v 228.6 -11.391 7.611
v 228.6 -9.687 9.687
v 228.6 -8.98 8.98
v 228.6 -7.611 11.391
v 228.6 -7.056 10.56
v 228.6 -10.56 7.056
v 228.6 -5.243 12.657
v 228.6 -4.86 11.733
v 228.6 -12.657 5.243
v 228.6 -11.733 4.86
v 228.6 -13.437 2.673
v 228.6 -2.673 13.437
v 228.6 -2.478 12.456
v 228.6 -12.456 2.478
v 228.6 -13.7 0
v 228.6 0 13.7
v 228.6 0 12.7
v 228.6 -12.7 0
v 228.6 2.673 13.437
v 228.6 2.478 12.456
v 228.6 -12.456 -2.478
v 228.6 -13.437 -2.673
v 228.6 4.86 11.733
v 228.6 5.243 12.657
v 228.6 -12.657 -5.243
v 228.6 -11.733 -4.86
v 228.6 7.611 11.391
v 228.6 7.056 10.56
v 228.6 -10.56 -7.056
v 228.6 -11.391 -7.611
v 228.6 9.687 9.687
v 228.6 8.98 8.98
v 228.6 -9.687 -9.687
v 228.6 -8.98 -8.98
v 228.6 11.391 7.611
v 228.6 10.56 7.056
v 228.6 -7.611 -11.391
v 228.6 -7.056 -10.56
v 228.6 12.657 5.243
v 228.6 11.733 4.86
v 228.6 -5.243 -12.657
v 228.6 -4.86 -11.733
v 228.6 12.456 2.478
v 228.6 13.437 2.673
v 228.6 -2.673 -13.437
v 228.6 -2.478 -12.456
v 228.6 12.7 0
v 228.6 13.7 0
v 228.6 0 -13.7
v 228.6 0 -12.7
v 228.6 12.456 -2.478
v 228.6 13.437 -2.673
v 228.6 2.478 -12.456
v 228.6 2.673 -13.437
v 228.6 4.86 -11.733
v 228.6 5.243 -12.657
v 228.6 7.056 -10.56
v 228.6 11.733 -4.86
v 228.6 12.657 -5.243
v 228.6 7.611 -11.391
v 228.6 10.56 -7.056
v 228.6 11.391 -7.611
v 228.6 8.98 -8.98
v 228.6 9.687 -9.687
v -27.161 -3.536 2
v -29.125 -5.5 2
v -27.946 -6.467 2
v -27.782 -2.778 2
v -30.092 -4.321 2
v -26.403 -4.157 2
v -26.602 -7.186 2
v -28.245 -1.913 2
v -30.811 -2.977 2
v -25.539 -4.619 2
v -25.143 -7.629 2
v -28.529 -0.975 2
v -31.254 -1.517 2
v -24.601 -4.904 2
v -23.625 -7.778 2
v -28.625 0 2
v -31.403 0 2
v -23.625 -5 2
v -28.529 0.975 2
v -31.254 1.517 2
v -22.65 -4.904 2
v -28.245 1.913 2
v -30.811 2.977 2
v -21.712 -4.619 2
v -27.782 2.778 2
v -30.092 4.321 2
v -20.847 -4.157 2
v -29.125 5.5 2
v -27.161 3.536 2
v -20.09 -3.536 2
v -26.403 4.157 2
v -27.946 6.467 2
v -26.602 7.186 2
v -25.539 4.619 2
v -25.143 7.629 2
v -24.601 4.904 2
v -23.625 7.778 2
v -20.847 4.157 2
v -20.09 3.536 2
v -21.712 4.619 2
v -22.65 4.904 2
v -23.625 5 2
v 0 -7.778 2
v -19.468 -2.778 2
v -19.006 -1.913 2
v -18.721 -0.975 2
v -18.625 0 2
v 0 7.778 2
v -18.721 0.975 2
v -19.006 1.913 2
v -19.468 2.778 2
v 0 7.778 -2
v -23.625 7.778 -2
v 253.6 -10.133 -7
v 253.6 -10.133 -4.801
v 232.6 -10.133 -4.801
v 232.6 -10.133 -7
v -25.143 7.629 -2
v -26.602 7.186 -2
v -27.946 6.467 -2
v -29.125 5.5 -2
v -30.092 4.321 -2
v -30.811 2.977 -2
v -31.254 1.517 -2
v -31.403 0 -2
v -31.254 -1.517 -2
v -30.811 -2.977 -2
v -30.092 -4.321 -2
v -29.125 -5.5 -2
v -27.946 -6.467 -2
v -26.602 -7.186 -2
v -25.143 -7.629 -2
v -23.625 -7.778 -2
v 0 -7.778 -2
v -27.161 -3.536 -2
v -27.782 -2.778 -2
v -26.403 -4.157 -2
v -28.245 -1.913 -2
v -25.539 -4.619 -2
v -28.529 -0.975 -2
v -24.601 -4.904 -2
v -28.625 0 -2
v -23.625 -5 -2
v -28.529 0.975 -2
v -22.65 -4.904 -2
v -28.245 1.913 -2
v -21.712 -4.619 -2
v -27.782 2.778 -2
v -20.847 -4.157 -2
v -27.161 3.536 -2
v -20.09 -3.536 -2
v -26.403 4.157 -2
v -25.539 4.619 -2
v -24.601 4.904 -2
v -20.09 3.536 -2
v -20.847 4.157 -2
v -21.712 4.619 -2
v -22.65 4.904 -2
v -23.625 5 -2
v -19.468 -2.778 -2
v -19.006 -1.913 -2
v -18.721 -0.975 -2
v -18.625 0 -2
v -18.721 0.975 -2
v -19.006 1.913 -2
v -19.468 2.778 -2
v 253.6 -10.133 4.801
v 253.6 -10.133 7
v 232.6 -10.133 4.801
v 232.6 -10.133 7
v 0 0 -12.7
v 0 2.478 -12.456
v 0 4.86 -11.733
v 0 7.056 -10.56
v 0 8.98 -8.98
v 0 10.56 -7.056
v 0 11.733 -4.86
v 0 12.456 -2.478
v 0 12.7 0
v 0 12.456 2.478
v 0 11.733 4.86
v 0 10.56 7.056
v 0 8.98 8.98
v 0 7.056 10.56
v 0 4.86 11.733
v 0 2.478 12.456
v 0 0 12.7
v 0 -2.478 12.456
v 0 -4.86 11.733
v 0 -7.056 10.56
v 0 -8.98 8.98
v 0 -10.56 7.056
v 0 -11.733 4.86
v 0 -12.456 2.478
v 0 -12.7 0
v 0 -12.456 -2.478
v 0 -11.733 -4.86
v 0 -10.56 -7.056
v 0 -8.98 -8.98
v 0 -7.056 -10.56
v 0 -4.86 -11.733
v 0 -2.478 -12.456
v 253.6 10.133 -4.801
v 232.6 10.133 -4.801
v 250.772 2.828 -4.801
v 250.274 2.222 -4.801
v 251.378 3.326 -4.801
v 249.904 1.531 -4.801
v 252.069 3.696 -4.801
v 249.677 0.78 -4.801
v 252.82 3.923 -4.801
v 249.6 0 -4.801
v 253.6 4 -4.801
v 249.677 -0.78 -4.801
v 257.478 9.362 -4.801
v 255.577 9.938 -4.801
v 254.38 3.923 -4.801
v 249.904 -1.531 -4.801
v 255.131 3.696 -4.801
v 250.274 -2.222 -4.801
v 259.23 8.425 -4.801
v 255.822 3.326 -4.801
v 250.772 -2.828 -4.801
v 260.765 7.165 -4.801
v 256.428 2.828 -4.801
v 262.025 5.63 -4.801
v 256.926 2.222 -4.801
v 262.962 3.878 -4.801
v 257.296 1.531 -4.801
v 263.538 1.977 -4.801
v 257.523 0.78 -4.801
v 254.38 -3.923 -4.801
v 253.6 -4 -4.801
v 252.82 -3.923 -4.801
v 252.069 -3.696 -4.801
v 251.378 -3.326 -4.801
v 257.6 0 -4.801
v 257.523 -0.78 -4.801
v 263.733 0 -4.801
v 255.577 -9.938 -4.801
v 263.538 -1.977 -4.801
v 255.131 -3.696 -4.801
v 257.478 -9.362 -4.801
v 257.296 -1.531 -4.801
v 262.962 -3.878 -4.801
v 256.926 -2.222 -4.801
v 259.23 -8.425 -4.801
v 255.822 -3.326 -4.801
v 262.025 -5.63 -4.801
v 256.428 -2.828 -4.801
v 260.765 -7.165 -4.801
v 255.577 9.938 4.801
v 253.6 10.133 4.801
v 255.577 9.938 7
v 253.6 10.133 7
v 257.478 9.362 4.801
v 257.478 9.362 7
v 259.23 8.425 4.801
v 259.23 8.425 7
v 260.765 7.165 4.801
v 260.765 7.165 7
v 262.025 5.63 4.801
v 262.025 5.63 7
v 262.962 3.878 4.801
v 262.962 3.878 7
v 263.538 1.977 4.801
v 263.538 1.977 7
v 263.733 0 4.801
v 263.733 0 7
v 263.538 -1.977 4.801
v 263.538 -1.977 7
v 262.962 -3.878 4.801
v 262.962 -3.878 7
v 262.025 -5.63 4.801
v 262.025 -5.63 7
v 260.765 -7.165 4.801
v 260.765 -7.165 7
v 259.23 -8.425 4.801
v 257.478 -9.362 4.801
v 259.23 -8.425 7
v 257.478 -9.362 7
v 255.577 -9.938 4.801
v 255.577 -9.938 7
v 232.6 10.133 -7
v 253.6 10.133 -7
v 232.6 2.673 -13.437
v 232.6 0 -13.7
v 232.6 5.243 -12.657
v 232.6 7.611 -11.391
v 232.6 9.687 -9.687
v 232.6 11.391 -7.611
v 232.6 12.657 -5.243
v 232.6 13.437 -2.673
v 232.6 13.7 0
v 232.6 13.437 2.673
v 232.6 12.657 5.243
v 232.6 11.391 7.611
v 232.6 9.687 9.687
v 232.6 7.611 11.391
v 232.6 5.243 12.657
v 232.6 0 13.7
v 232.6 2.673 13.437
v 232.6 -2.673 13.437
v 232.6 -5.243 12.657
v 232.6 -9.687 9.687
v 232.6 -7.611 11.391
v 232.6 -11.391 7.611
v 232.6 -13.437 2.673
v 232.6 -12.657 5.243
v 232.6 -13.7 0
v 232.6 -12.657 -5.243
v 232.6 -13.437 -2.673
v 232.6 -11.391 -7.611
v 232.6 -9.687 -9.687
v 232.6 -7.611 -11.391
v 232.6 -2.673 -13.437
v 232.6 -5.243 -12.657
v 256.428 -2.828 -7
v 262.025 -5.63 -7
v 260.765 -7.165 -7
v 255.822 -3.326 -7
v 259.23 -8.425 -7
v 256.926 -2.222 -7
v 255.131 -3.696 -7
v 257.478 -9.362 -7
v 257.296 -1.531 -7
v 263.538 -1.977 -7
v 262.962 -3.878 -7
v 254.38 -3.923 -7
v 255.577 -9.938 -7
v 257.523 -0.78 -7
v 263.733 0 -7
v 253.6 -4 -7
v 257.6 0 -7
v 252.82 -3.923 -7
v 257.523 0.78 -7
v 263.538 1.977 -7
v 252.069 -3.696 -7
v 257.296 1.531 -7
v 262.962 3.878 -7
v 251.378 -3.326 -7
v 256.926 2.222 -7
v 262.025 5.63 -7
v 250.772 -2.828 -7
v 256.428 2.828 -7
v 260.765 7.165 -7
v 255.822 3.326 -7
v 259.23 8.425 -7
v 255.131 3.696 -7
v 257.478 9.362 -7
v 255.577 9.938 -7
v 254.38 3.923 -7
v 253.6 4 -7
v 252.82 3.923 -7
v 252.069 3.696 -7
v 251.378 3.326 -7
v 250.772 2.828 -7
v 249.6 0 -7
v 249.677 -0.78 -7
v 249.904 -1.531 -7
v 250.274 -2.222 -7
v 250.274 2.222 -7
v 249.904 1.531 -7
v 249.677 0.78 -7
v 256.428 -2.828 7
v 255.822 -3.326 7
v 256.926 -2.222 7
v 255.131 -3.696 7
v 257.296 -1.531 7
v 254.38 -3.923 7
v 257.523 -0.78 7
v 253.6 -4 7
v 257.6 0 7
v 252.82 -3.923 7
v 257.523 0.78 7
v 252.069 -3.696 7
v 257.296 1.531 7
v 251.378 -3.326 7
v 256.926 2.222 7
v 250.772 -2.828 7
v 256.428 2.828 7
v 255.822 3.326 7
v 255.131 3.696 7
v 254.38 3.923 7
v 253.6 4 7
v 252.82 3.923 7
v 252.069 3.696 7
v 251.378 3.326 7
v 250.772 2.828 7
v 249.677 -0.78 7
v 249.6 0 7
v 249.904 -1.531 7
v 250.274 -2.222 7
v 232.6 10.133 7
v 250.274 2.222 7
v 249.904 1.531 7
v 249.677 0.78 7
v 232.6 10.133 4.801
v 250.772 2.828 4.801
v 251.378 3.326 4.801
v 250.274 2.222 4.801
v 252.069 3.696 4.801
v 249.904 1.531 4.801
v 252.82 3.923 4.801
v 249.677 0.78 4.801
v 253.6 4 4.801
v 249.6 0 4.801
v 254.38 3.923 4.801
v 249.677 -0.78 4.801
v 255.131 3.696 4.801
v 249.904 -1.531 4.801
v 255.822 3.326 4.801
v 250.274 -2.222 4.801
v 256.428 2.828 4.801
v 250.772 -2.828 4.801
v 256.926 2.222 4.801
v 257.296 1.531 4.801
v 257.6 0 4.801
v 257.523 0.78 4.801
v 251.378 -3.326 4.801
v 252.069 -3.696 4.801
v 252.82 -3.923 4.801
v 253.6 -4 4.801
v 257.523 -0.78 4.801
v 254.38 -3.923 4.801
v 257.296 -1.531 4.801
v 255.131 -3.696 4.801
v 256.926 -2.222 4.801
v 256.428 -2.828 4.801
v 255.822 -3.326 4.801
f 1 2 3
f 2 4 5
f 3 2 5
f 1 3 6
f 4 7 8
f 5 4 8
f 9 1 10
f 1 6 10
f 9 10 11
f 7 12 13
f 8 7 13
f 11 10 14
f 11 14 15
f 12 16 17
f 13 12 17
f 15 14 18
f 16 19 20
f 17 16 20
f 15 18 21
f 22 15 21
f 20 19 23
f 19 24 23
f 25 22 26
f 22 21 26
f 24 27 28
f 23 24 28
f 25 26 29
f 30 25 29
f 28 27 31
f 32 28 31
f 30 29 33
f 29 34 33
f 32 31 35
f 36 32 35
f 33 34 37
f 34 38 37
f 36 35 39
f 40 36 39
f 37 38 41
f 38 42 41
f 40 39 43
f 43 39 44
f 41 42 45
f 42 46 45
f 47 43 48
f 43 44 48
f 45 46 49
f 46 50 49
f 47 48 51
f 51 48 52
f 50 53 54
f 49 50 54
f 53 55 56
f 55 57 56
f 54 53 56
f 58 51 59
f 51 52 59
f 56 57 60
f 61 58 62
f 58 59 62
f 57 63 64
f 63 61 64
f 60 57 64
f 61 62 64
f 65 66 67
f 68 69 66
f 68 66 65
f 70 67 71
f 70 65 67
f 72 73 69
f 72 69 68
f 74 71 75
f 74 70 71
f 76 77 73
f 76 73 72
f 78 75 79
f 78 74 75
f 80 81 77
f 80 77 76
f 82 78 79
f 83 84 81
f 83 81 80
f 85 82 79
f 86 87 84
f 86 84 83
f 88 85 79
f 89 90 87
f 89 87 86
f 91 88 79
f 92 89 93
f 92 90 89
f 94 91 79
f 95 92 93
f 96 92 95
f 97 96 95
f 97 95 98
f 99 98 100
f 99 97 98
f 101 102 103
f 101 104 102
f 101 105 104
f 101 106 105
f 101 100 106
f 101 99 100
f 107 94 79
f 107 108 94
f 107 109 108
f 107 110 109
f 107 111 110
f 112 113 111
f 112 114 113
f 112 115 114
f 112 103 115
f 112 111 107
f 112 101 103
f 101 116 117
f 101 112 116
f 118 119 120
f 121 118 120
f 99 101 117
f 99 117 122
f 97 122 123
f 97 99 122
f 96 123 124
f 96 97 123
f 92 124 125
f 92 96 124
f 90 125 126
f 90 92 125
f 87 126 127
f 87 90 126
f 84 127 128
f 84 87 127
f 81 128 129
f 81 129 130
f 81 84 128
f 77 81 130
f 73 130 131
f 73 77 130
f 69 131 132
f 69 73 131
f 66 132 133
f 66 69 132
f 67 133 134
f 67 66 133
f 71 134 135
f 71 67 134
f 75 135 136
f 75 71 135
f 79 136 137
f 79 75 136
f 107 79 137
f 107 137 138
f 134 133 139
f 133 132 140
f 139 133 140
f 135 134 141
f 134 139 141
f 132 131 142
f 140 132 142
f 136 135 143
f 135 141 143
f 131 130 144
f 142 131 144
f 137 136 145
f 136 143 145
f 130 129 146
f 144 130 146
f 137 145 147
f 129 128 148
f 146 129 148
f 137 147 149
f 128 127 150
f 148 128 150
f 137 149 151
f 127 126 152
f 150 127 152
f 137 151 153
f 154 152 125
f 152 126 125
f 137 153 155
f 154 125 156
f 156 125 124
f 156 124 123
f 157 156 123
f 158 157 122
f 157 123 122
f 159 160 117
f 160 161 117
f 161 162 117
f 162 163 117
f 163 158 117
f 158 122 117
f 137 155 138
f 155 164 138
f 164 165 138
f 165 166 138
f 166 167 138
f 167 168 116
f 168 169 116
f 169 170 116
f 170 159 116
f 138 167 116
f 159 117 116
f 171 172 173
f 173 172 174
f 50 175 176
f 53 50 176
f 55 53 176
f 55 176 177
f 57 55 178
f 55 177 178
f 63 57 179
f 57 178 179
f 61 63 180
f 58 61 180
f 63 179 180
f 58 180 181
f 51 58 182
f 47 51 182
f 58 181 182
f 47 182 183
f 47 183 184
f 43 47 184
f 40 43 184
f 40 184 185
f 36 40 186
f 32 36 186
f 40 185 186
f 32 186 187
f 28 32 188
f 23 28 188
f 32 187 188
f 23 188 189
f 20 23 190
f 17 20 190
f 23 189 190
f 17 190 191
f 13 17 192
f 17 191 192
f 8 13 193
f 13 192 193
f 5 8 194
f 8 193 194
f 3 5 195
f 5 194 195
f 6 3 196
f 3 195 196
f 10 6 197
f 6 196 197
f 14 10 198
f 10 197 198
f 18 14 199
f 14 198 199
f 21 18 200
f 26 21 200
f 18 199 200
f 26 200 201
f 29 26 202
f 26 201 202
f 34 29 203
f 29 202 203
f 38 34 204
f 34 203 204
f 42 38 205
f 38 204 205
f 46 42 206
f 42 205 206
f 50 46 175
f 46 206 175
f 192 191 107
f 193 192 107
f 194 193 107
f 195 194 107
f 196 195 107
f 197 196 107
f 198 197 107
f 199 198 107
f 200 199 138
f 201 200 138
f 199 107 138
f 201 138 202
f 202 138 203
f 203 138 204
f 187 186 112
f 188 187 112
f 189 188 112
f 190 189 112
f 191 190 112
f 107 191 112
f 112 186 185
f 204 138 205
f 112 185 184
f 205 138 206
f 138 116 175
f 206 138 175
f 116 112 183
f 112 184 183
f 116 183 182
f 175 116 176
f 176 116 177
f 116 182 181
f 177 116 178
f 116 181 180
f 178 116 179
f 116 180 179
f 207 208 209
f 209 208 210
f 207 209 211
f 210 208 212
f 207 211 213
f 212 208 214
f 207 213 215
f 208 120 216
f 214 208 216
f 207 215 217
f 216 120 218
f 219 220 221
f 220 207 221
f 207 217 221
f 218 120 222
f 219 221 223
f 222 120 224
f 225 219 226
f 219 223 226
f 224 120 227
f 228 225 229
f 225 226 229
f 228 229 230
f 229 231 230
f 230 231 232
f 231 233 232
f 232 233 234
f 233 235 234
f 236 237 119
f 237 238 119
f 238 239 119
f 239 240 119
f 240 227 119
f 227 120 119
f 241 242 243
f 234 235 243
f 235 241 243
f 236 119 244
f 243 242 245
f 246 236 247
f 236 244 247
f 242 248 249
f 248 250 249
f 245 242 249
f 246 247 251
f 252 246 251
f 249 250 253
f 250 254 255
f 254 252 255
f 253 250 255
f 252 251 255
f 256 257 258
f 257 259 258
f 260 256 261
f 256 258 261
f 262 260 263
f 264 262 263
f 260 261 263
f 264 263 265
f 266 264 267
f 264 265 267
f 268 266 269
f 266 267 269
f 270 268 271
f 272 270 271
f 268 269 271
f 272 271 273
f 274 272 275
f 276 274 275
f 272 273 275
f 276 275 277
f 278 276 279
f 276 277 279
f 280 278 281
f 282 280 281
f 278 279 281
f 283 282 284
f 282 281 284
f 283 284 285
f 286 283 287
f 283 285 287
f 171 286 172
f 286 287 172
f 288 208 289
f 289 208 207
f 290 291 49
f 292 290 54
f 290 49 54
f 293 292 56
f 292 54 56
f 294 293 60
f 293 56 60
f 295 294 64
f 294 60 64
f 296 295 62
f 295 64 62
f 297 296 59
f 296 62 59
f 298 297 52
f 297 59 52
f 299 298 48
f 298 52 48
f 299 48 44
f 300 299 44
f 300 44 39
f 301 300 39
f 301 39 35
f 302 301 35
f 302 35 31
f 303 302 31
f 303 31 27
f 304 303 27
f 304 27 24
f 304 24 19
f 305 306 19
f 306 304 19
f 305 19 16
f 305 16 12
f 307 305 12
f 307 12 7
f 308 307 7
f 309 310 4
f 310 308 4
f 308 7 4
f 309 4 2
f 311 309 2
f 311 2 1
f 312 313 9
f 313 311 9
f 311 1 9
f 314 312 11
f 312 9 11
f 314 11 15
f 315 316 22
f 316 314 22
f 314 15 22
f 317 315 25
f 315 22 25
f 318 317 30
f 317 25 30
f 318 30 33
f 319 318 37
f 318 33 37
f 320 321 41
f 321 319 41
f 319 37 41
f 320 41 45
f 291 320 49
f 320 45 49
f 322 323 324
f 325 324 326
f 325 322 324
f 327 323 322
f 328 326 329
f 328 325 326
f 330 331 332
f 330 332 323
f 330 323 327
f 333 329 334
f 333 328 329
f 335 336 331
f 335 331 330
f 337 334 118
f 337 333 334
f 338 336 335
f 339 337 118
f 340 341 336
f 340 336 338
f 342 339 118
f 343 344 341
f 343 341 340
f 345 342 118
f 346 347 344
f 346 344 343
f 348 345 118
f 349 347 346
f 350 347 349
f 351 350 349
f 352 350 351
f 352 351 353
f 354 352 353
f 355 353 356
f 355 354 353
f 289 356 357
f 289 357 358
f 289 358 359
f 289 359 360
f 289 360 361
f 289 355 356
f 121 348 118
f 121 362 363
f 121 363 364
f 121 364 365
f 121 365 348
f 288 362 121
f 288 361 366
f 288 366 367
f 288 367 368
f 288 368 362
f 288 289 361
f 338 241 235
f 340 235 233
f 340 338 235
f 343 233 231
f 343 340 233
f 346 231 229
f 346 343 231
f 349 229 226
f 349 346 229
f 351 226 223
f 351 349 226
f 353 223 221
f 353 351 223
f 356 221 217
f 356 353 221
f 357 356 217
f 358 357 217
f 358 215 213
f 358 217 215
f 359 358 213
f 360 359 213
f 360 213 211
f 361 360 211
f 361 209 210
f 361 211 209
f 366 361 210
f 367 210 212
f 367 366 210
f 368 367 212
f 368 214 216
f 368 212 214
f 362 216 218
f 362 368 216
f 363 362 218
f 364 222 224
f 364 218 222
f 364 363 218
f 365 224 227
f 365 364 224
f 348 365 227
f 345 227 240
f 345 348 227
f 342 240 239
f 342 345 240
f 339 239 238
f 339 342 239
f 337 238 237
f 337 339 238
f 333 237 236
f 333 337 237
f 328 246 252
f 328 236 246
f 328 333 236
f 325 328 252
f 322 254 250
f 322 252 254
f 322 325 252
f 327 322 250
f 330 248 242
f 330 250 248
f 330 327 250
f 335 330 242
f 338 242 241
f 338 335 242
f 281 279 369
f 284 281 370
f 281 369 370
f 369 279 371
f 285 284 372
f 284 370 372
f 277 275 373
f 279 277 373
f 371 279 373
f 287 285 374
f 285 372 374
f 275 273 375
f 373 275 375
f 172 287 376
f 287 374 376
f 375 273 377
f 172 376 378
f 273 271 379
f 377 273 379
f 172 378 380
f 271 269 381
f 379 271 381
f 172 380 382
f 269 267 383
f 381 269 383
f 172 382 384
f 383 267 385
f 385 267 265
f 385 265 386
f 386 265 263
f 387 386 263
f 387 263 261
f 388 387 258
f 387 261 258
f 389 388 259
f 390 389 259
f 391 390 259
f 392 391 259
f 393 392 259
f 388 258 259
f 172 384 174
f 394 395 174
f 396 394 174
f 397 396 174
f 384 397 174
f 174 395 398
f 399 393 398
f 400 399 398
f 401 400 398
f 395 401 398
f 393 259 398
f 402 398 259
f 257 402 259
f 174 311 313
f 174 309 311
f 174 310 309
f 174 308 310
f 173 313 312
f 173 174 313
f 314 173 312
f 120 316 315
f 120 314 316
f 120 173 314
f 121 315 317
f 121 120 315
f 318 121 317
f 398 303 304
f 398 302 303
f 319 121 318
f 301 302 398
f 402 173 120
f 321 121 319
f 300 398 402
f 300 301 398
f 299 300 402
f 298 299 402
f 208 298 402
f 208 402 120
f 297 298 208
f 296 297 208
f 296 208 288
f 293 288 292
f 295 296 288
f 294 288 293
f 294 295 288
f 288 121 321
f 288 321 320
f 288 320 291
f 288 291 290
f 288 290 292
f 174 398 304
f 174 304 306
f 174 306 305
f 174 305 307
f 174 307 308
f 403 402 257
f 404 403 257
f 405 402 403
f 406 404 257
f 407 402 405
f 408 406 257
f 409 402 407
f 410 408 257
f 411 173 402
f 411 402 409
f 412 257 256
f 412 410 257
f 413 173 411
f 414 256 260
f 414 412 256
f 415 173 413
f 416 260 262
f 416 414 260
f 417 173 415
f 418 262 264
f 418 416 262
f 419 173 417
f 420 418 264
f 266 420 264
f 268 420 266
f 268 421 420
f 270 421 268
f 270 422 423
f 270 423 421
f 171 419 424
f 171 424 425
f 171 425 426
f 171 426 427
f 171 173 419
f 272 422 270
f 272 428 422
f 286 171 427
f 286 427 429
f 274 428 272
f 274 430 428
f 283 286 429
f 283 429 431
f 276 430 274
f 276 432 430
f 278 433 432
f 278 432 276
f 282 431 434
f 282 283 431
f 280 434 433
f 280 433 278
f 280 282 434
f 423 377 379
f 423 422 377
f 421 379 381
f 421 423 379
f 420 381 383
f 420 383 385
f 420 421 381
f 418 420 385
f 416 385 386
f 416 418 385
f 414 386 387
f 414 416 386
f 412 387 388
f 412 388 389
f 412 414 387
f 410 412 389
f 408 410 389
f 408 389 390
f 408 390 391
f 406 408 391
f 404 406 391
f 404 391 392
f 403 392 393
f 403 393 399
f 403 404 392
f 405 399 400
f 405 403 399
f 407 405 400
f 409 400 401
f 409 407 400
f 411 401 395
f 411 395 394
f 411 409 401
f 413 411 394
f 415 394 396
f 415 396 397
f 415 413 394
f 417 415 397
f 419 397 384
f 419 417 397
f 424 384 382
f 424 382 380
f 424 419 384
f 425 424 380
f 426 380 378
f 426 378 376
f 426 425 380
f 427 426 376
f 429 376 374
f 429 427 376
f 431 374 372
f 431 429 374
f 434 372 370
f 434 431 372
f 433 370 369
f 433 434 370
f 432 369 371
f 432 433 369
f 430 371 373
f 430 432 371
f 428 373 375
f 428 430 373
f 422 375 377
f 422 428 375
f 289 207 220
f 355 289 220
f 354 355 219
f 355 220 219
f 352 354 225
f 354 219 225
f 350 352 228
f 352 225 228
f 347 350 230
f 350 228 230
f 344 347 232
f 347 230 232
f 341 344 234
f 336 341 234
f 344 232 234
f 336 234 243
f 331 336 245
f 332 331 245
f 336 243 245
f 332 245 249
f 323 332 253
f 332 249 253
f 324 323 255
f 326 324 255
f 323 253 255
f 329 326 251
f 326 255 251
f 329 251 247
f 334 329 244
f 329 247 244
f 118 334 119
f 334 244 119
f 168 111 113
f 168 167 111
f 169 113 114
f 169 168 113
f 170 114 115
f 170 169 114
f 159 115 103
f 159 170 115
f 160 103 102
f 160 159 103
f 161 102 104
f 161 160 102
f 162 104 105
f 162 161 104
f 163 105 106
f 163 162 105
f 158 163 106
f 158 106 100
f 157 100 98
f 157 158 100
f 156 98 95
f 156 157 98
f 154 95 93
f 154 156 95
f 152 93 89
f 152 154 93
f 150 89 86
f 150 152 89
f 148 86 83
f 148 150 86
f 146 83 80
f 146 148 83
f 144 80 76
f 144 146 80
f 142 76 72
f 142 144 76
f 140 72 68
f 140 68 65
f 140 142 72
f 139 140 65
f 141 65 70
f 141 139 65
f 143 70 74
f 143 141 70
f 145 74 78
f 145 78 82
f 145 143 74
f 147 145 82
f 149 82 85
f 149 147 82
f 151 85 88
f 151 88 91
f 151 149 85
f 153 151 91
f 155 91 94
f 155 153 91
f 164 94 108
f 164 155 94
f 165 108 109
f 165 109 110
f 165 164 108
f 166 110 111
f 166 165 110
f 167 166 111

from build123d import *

# Parameters (mm, degrees)
SKETCH1_R               = 12.7
EXTRUDE1_DEPTH          = 228.6
SKETCH2_R               = 5
EXTRUDE2_DEPTH          = 2
SKETCH3_R               = 13.7
EXTRUDE3_DEPTH          = 4
SKETCH4_R               = 4
EXTRUDE4_DEPTH          = 7
SKETCH5_W               = 127.127972269
SKETCH5_H               = 9.602426348
CUT_EXTRUDE1_DEPTH      = 14.7
CUT_EXTRUDE1_DEPTH_BACK = 14.7


with BuildPart() as part:
    # Sketch1 → Extrude1 (new body)
    with BuildSketch(Plane(origin=(0, 0, 0), x_dir=(0, 0, -1), z_dir=(1, 0, 0))):
        Circle(SKETCH1_R)
    extrude(amount=EXTRUDE1_DEPTH)

    # Sketch2 → Extrude2 (add, symmetric)
    with BuildSketch(Plane.XY):
        with BuildLine():
            Line((0, 7.778067586), (-23.625125491, 7.778067586))
            ThreePointArc((-23.625125491, 7.778067586), (-31.403193077, 0), (-23.625125491, -7.778067586))
            Line((-23.625125491, -7.778067586), (0, -7.778067586))
            Line((0, -7.778067586), (0, 7.778067586))
        make_face()
        with Locations((-23.625125491, 0)):
            Circle(SKETCH2_R, mode=Mode.SUBTRACT)
    extrude(amount=EXTRUDE2_DEPTH, both=True)

    # Sketch3 → Extrude3 (add)
    with BuildSketch(Plane(origin=(228.6, 0, 0), x_dir=(0, 0, -1), z_dir=(1, 0, 0))):
        Circle(SKETCH3_R)
    extrude(amount=EXTRUDE3_DEPTH)

    # Sketch4 → Extrude4 (add, symmetric)
    with BuildSketch(Plane.XY):
        with BuildLine():
            Line((232.6, 10.132851916), (253.6, 10.132851916))
            ThreePointArc((253.6, 10.132851916), (263.732851916, 0), (253.6, -10.132851916))
            Line((253.6, -10.132851916), (232.6, -10.132851916))
            Line((232.6, -10.132851916), (232.6, 10.132851916))
        make_face()
        with Locations((253.6, 0)):
            Circle(SKETCH4_R, mode=Mode.SUBTRACT)
    extrude(amount=EXTRUDE4_DEPTH, both=True)

    # Sketch5 → Cut-Extrude1 (cut, two sides)
    with BuildSketch(Plane(origin=(0, 0, 0), x_dir=(1, 0, 0), z_dir=(0, 1, 0))) as cut_extrude1_sk:
        with Locations((296.163986135, 0)):
            Rectangle(SKETCH5_W, SKETCH5_H)
    extrude(amount=CUT_EXTRUDE1_DEPTH, mode=Mode.SUBTRACT)
    extrude(cut_extrude1_sk.sketch, amount=-CUT_EXTRUDE1_DEPTH_BACK, mode=Mode.SUBTRACT)


solid = part.part
